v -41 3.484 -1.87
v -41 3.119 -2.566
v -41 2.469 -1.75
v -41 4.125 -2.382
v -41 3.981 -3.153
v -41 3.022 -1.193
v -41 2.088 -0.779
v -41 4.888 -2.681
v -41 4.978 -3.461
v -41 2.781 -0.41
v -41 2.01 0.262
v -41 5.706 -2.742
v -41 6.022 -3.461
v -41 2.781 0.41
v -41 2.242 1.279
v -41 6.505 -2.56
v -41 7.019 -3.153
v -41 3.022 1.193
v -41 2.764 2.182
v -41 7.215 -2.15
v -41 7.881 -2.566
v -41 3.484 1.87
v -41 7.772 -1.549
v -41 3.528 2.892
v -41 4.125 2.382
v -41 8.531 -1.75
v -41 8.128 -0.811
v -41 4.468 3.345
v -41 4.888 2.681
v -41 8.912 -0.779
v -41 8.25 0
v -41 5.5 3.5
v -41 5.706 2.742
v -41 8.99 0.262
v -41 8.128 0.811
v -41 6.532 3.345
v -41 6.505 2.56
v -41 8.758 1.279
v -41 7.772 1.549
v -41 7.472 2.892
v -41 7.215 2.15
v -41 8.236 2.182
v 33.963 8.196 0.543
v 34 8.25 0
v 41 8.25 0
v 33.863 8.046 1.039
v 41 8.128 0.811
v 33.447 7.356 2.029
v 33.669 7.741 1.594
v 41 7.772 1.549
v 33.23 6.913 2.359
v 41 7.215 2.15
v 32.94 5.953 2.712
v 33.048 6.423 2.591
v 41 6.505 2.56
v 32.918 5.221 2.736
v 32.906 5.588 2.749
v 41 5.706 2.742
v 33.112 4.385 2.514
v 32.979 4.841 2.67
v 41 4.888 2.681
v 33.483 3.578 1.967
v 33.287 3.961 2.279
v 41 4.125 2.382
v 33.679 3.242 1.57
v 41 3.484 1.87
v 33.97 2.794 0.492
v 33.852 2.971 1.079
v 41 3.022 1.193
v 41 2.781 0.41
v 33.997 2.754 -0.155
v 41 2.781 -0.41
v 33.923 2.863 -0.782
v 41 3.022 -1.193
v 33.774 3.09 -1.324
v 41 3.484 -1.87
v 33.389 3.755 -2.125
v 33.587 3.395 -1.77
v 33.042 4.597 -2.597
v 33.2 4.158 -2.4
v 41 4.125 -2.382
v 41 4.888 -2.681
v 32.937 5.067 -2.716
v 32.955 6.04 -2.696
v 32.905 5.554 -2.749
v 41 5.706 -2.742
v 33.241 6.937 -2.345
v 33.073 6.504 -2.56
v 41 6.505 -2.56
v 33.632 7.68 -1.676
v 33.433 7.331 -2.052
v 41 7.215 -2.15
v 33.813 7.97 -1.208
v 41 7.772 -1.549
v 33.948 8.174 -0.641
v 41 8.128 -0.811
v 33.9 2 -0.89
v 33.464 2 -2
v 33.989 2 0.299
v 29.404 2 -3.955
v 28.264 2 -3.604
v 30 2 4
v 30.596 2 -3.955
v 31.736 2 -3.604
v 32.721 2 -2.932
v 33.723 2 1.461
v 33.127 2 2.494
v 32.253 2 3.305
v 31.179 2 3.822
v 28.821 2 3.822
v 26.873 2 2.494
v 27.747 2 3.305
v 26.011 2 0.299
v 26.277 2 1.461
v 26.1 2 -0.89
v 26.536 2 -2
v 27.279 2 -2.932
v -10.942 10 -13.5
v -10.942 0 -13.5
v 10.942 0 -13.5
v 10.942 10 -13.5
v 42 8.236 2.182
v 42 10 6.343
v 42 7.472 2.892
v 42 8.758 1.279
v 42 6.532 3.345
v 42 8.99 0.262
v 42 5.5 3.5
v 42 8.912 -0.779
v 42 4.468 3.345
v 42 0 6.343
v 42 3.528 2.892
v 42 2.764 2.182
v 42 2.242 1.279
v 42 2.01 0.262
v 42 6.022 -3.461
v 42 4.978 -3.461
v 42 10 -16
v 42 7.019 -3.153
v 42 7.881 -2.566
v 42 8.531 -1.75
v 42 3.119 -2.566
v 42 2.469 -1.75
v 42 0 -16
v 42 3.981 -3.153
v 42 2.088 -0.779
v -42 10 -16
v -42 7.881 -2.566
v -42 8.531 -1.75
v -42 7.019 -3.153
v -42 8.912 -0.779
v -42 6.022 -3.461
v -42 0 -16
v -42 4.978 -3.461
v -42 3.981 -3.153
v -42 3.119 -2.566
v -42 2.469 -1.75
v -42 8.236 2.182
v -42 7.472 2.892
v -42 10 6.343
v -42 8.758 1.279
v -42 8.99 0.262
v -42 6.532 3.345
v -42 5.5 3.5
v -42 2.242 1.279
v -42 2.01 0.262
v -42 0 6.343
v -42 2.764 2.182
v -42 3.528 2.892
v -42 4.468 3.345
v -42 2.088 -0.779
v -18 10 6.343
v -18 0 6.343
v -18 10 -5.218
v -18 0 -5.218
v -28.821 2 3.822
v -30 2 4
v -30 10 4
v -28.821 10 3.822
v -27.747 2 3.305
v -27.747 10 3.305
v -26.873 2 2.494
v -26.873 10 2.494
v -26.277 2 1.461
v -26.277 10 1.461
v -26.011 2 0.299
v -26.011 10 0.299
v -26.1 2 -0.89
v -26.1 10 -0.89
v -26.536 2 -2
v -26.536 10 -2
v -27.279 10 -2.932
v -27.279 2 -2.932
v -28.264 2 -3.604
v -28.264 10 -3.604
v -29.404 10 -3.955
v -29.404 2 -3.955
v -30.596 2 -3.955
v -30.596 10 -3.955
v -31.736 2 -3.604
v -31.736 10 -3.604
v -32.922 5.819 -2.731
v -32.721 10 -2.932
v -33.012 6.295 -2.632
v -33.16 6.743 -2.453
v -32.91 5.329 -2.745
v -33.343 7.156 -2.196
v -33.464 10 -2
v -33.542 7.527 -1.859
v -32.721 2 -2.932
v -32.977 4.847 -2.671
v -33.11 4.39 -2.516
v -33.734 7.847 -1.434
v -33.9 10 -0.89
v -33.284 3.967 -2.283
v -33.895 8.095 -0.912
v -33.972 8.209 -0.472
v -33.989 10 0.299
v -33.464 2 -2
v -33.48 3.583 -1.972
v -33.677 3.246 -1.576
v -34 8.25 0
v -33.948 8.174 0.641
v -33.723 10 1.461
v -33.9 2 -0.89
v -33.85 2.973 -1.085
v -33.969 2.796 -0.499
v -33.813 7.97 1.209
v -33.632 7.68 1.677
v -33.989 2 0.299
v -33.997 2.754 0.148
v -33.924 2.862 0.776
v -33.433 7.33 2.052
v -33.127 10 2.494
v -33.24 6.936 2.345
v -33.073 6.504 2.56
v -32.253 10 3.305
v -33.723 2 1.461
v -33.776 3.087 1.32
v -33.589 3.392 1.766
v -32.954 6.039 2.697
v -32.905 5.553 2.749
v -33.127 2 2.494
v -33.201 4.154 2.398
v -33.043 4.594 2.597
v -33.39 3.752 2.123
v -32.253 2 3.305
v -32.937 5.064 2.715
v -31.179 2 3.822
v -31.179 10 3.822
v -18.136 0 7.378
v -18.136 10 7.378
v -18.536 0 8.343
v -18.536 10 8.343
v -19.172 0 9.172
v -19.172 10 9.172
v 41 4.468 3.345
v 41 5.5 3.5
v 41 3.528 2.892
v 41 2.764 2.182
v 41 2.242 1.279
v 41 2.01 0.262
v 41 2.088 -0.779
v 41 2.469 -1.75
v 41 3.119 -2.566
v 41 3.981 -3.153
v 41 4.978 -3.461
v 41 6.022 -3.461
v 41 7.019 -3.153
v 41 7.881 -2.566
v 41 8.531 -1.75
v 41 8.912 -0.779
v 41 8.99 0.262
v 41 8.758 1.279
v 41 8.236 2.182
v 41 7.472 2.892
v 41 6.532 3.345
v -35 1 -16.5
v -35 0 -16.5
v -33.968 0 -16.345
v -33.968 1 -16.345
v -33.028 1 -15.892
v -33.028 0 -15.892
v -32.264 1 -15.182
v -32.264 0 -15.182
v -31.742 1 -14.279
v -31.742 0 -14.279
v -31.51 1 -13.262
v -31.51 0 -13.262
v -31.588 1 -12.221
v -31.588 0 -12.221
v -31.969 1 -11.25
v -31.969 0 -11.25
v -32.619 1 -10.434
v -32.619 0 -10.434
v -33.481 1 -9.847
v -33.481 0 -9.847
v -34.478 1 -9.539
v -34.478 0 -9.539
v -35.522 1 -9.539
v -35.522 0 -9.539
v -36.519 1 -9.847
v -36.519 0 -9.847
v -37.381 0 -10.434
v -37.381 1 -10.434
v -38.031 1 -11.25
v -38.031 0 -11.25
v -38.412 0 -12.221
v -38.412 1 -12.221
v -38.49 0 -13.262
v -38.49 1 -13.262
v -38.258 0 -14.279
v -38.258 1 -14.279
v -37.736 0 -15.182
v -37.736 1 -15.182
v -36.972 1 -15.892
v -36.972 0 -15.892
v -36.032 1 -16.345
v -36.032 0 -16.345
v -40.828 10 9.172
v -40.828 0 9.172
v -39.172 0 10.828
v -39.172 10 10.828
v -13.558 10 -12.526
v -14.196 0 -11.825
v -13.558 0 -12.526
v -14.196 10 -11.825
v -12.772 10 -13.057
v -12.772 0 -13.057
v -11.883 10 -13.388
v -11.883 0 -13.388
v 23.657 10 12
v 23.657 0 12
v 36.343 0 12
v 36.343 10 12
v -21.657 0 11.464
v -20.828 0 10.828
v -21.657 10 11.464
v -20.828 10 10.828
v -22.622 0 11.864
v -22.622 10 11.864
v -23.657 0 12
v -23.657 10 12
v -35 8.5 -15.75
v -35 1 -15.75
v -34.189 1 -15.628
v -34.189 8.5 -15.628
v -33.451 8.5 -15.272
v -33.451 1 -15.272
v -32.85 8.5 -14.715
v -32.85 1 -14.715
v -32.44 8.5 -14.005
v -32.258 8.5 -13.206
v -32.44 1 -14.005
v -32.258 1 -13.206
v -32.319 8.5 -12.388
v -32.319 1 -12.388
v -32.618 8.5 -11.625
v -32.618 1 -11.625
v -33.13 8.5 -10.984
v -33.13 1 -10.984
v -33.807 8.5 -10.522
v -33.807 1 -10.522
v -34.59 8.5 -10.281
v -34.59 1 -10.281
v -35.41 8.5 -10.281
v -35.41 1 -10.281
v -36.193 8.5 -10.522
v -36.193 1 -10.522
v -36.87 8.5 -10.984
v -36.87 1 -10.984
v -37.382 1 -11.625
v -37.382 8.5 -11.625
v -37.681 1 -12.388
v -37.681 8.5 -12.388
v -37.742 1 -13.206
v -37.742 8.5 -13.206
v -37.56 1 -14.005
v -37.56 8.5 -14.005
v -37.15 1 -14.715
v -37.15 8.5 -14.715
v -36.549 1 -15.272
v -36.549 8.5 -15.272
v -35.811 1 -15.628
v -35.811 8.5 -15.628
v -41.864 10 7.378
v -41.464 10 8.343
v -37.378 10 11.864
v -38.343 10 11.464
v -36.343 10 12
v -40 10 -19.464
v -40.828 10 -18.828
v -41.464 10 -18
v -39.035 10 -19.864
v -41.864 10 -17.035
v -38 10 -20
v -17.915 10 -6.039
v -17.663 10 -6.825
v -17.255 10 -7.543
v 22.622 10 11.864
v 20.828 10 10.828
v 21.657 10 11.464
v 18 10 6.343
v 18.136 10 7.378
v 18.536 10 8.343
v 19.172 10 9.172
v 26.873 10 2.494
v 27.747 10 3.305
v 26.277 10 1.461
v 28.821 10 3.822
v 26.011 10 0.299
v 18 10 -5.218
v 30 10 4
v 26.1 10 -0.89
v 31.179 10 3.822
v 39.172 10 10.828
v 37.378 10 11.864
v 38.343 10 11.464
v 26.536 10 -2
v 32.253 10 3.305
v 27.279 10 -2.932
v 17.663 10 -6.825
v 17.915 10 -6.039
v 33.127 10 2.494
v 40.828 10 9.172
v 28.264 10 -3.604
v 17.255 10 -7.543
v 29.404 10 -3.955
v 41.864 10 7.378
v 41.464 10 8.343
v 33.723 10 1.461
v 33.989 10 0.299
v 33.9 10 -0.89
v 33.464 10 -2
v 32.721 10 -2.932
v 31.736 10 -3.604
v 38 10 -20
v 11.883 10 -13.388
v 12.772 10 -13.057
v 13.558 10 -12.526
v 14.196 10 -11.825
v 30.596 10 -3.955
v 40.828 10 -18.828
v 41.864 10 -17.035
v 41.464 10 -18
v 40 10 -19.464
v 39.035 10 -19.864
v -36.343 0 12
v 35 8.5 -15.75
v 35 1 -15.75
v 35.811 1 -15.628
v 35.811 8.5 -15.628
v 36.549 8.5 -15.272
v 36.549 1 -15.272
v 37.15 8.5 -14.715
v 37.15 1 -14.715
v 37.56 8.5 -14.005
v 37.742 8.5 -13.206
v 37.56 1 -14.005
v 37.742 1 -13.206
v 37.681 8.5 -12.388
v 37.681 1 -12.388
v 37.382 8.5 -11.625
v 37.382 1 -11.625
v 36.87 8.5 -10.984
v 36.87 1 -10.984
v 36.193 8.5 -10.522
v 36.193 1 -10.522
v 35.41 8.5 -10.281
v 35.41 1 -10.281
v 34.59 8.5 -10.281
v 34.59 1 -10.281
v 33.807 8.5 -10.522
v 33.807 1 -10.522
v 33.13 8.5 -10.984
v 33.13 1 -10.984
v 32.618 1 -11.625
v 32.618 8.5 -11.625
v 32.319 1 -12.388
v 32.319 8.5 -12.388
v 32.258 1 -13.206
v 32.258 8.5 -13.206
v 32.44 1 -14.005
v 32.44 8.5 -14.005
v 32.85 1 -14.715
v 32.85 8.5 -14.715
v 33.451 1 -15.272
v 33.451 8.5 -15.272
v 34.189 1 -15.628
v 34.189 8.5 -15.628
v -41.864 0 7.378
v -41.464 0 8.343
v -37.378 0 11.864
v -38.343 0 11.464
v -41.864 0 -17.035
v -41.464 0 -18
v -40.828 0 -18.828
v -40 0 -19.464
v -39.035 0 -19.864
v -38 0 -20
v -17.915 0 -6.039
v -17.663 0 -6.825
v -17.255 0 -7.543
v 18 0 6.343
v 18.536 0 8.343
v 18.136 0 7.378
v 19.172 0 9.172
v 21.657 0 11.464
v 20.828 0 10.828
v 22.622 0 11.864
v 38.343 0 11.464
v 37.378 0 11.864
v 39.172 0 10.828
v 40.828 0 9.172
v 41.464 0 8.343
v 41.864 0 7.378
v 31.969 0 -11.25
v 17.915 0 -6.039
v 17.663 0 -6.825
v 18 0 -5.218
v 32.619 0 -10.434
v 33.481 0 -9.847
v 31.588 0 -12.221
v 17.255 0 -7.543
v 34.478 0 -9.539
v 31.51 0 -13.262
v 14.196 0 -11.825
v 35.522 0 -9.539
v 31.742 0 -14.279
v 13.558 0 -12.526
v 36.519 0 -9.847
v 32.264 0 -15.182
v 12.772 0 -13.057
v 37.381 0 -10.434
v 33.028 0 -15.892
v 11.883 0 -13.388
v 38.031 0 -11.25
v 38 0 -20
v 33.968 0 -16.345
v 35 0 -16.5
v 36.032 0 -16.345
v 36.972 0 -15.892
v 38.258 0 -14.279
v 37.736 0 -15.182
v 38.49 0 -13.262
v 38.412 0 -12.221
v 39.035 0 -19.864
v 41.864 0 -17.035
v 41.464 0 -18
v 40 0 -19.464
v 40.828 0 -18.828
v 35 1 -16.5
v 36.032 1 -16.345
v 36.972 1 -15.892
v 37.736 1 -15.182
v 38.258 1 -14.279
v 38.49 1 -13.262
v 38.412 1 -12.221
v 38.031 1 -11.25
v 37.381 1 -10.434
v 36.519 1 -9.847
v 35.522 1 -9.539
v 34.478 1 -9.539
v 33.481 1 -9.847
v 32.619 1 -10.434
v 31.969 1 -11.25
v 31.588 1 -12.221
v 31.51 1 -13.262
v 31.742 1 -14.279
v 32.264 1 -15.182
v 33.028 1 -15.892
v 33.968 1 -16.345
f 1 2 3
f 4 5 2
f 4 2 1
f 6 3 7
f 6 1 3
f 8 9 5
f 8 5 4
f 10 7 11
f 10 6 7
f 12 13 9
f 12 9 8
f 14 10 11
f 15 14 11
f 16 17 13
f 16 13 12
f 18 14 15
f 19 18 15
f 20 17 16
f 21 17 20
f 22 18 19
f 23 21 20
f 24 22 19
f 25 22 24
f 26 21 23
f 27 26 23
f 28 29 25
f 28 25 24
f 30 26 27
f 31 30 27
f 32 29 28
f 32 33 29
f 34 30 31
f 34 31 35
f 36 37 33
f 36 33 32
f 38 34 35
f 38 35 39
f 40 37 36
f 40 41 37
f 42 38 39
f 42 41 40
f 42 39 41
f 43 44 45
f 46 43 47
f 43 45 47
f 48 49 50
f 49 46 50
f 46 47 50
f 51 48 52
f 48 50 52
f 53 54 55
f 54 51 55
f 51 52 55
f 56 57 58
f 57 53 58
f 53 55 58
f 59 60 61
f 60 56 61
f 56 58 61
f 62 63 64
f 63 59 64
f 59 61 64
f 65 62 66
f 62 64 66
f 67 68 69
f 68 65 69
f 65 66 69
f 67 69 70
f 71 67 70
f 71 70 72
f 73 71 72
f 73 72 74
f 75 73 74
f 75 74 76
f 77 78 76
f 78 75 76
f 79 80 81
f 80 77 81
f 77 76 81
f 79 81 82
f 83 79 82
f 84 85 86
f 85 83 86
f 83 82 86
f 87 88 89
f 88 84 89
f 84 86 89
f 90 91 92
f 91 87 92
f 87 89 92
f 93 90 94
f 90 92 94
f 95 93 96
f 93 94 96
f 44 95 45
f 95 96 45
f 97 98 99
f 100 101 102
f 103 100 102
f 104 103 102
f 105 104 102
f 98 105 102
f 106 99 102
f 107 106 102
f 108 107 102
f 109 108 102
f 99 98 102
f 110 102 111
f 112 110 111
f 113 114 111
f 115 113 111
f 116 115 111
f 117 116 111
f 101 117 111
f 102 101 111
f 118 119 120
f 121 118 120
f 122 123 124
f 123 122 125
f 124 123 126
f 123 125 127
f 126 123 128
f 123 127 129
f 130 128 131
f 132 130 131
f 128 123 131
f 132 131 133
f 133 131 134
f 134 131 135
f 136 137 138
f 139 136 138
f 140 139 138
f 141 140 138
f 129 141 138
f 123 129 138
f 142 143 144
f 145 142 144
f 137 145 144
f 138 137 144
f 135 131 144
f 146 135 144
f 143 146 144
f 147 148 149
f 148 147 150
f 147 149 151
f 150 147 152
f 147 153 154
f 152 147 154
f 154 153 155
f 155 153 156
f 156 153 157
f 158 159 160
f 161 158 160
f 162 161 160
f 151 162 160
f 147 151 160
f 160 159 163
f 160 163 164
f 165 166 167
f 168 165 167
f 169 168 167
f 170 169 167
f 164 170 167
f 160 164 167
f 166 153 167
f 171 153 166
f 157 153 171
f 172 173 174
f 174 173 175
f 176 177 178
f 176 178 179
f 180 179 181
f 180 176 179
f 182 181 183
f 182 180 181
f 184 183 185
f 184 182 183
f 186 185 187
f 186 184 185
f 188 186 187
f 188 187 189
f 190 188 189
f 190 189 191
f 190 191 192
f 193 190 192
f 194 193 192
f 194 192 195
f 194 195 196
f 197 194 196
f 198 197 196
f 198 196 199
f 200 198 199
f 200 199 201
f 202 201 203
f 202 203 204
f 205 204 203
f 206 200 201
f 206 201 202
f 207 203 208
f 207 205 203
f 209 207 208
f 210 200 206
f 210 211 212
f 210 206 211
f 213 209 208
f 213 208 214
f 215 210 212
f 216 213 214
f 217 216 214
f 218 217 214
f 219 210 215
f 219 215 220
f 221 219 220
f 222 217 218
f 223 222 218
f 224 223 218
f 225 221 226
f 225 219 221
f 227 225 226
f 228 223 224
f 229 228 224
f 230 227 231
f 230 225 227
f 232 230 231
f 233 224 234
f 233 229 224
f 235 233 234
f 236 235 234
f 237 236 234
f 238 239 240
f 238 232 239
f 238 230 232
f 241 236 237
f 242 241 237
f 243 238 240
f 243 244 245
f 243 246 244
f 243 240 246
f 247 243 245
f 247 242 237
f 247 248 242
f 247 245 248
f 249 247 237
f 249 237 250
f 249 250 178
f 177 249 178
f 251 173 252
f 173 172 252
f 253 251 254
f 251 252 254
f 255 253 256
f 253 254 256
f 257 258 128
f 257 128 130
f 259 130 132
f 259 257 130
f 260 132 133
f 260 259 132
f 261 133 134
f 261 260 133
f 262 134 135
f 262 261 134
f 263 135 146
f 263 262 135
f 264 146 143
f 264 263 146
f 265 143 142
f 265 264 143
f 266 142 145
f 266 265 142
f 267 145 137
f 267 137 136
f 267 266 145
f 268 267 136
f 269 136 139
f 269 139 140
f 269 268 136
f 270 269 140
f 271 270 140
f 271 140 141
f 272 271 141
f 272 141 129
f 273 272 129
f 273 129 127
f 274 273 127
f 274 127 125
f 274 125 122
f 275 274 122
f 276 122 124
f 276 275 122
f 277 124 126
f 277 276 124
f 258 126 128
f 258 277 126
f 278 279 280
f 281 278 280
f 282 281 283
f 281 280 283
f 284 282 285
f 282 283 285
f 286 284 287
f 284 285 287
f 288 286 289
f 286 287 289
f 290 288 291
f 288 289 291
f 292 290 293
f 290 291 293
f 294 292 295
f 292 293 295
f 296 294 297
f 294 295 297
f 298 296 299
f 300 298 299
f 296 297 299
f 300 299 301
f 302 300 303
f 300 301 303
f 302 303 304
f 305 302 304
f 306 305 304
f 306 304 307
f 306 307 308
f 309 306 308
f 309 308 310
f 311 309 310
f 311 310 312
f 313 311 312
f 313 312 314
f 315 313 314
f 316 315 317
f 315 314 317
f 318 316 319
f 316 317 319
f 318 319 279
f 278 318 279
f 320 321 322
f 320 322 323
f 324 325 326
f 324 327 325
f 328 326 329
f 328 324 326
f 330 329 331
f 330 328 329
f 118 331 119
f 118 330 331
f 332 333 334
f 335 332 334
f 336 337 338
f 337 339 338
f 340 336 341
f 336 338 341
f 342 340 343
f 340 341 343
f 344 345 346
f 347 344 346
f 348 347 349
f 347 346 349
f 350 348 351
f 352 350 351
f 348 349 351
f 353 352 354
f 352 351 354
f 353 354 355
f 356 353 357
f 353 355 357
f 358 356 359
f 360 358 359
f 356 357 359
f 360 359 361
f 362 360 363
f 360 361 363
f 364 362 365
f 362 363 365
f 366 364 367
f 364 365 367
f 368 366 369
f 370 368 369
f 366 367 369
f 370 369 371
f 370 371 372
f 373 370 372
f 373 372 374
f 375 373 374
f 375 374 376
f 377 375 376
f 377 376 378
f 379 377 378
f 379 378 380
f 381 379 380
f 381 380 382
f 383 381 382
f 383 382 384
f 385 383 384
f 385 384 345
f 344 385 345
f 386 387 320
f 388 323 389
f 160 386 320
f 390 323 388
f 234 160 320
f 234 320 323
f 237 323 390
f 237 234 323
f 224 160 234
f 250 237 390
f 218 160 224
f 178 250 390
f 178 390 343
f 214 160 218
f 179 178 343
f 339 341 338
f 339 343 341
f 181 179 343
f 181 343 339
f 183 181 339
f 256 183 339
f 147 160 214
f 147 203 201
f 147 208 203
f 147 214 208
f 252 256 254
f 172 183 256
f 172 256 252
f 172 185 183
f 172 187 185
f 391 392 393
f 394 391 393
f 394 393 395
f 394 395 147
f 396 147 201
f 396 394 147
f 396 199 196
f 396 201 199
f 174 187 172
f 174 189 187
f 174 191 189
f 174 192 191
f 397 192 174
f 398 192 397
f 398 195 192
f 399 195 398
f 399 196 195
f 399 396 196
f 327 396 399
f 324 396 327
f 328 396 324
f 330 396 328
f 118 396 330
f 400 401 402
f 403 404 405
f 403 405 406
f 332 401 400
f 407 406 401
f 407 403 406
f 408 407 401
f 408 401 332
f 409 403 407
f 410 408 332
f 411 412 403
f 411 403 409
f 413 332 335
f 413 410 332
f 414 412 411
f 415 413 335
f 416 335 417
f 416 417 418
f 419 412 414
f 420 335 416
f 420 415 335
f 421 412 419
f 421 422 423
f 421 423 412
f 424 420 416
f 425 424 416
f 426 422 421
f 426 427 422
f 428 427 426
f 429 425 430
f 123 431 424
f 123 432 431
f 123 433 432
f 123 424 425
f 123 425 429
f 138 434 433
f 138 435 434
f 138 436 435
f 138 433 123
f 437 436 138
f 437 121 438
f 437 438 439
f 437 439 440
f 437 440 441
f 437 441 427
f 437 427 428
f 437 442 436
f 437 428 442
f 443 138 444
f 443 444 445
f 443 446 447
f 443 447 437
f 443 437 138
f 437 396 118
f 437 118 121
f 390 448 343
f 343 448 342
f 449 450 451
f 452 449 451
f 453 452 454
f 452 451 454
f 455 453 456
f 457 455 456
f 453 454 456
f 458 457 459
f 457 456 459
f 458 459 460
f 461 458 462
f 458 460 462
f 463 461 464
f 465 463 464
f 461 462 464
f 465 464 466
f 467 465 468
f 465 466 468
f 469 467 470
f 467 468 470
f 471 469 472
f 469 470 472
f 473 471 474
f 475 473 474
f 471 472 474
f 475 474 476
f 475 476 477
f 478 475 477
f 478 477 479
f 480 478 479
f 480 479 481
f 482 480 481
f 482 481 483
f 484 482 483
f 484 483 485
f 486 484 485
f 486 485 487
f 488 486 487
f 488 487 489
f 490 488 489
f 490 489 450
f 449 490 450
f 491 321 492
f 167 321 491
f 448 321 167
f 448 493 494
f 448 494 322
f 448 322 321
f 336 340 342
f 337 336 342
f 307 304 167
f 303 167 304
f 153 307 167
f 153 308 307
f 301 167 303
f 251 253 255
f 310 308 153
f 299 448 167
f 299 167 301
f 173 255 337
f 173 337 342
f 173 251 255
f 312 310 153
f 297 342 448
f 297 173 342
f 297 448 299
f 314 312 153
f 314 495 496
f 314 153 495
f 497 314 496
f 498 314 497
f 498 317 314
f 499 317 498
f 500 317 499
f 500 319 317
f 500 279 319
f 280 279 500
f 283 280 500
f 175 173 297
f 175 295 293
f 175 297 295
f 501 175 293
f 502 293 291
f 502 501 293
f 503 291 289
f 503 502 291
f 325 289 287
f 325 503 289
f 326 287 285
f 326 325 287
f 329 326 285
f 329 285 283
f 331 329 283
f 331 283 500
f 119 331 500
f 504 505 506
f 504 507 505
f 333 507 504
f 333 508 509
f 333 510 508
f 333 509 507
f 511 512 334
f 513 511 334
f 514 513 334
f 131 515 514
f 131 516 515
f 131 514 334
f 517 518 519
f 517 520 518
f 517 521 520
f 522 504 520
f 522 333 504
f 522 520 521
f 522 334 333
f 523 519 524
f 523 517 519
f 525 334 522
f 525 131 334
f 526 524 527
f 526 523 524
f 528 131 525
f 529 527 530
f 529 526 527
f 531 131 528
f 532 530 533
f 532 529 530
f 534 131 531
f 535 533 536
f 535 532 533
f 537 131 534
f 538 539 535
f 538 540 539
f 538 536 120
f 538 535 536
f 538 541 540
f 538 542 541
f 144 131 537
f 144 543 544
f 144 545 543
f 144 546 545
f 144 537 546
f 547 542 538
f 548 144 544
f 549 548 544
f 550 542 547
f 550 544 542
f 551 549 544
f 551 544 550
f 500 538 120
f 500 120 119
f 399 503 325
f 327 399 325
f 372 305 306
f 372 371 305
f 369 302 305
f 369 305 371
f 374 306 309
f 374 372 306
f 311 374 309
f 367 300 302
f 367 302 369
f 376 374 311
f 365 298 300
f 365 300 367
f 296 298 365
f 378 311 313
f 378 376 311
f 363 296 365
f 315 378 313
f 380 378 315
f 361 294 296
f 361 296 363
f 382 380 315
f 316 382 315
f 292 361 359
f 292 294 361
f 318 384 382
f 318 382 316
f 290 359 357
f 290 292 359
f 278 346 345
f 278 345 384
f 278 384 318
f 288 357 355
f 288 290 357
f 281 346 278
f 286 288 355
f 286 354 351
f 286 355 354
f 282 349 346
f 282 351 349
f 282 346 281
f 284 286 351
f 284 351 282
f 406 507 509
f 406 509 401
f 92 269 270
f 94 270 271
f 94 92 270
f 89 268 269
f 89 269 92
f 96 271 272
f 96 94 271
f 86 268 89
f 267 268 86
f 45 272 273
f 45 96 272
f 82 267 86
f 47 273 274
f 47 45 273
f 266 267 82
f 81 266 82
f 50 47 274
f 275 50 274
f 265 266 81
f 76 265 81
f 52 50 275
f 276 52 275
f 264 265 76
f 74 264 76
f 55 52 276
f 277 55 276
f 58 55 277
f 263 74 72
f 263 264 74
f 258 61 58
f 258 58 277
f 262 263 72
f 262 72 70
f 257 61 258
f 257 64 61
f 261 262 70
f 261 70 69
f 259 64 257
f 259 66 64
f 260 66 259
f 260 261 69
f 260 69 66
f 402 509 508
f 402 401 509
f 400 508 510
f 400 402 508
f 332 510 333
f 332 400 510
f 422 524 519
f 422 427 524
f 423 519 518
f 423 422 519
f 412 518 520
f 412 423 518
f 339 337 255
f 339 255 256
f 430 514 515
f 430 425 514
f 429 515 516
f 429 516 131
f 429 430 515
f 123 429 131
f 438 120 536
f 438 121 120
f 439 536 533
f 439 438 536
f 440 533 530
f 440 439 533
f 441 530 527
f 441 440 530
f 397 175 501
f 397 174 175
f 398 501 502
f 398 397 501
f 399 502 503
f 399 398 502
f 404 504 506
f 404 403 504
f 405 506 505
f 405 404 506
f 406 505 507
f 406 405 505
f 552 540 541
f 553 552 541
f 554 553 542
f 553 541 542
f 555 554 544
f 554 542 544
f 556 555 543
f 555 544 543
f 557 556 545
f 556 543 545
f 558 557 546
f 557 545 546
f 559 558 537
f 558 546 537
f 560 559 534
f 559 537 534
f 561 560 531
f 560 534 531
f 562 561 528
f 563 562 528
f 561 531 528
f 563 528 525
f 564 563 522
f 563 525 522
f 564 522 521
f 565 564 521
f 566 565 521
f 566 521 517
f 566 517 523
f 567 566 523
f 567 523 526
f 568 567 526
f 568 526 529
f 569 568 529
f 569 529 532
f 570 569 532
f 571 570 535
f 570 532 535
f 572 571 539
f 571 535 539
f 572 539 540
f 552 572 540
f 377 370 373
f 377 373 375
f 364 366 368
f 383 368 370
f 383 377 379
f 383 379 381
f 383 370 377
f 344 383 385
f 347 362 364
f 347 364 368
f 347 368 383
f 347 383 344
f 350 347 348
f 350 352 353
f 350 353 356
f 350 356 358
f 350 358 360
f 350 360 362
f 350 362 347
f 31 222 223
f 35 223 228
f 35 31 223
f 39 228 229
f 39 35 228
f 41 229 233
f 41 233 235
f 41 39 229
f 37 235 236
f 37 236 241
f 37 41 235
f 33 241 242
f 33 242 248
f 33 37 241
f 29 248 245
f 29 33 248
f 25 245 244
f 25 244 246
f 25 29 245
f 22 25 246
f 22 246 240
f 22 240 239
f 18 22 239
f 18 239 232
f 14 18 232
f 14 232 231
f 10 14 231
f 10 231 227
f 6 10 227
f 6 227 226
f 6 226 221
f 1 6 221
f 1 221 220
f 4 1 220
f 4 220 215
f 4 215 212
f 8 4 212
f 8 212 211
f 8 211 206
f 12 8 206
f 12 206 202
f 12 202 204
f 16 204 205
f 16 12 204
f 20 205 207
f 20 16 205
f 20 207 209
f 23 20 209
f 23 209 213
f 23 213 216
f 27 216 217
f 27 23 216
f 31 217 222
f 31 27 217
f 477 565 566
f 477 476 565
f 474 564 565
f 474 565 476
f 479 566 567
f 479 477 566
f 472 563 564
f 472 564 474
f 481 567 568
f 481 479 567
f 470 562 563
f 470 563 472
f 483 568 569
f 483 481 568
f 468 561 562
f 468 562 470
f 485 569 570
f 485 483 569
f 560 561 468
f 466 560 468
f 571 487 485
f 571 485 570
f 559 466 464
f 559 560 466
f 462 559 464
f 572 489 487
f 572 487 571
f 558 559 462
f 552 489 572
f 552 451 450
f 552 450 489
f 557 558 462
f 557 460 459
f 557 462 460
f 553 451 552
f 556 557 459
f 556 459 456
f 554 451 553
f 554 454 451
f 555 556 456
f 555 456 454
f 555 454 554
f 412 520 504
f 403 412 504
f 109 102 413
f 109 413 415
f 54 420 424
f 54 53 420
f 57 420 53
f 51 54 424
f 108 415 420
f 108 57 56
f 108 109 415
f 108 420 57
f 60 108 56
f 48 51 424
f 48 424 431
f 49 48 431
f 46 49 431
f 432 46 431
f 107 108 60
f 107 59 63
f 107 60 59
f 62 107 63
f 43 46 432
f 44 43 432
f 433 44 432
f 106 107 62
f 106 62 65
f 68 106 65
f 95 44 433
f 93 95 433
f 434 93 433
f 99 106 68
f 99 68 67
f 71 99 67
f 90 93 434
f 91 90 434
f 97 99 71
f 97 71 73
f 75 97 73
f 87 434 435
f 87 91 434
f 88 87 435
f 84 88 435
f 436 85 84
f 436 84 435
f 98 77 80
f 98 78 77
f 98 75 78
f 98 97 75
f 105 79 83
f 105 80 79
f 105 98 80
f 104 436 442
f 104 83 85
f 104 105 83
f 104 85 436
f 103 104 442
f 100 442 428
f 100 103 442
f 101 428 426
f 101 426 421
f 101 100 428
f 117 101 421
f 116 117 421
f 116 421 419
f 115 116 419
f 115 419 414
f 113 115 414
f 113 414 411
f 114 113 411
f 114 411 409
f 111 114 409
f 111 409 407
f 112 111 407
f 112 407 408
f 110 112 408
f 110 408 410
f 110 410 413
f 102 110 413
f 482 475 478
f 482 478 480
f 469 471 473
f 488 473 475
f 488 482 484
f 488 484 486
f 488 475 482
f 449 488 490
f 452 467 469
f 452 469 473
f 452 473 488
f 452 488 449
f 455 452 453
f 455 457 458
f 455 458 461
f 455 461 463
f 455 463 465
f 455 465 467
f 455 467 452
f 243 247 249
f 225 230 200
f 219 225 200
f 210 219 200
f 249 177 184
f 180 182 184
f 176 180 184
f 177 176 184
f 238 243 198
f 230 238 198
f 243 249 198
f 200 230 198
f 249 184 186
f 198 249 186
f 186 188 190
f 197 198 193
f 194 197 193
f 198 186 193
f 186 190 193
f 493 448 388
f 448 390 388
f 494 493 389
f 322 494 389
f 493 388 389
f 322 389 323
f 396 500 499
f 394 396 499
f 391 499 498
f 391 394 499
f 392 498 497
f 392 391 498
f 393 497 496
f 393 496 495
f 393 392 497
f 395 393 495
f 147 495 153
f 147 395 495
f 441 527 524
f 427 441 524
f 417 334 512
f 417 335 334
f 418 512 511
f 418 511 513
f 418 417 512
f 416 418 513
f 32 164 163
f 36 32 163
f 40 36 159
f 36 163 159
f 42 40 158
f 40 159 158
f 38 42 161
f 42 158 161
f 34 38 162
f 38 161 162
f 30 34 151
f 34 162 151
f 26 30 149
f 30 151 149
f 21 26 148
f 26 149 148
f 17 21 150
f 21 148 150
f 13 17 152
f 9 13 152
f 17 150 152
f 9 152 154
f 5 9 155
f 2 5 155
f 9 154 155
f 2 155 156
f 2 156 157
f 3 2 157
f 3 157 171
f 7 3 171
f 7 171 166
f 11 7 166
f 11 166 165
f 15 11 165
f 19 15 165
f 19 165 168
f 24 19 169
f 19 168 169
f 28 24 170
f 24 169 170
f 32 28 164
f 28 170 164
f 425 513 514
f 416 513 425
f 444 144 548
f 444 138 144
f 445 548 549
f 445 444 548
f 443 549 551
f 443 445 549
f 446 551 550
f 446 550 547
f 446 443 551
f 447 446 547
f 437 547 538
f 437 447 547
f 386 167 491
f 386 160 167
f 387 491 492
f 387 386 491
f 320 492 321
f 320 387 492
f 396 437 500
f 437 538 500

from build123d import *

# Parameters (mm, degrees)
ESQUISSE1_R                 = 4
BOSS_EXTRU_1_DEPTH          = 10
CHANFREIN3_SIZE             = 4
CONG_2_R                    = 4
ESQUISSE3_R                 = 4
BOSS_EXTRU_2_DEPTH          = 2
ENL_V_START                 = -42
ENL_V_MAT_EXTRU_4_OUTLINE_R = 2.75
ENL_V_MAT_EXTRU_4_DEPTH     = 9.0952626
CONG_4_R                    = 4
ESQUISSE7_R                 = 2.75
ENL_V_MAT_EXTRU_5_DEPTH     = 8.5
ESQUISSE7_4_R               = 3.5
ESQUISSE7_4_R_2             = 2.75
ENL_V_MAT_EXTRU_8_DEPTH     = 1
ESQUISSE8_R                 = 3.5
ENL_V_MAT_EXTRU_9_DEPTH     = 1
ENL_V_START_2               = -1
ESQUISSE9_R                 = 3.5
ENL_V_MAT_EXTRU_10_DEPTH    = 1


# Read off the part's stored shape, not the designer's step: Enlèv. mat.-Extru.4
with BuildPart() as part:
    # Esquisse1 → Boss.-Extru.1 (new body)
    # profile 1 of 4: a face of its own
    with BuildSketch(Plane(origin=(0, 0, 0), x_dir=(1, 0, 0), z_dir=(0, 1, 0))):
        Polygon((-18, 6.5), (-18, 12), (-18, 13.5), (-13, 13.5), (0, 13.5), (0, 20), (-42, 20), (-42, 12), (-42, 0), (-42, -12), (-18, -12), align=None)
        with Locations(Location((-30, 0, 0), (0, 0, 270))):
            Circle(ESQUISSE1_R, mode=Mode.SUBTRACT)
    # profile 2 of 4: a face of its own
    with BuildSketch(Plane(origin=(0, 0, 0), x_dir=(1, 0, 0), z_dir=(0, 1, 0))):
        Polygon((0, 20), (0, 13.5), (13, 13.5), (18, 13.5), (18, 12), (18, 6.5), (18, -12), (42, -12), (42, 0), (42, 12), (42, 20), align=None)
        with Locations(Location((30, 0, 0), (0, 0, 270))):
            Circle(ESQUISSE1_R, mode=Mode.SUBTRACT)
    # profile 3 of 4: a face of its own
    with BuildSketch(Plane(origin=(0, 0, 0), x_dir=(1, 0, 0), z_dir=(0, 1, 0))):
        Polygon((-18, 13.5), (-18, 12), (-18, 6.5), (-13, 13.5), align=None)
    # profile 4 of 4: a face of its own
    with BuildSketch(Plane(origin=(0, 0, 0), x_dir=(1, 0, 0), z_dir=(0, 1, 0))):
        Polygon((18, 13.5), (13, 13.5), (18, 6.5), (18, 12), align=None)
    extrude(amount=BOSS_EXTRU_1_DEPTH)

    # Chanfrein3
    chanfrein3_edges = [part.edges().sort_by_distance(p)[0] for p in [
        (-18, 5, 12),
        (-42, 5, 12),
        (42, 5, 12),
        (18, 5, 12),
    ]]
    chamfer(chanfrein3_edges, length=CHANFREIN3_SIZE)

    # Congé2
    cong_2_edges = [part.edges().sort_by_distance(p)[0] for p in [
        (42, 5, 8),
        (22, 5, 12),
        (38, 5, 12),
        (18, 5, 8),
        (-22, 5, 12),
        (-38, 5, 12),
        (-42, 5, 8),
        (-18, 5, 8),
    ]]
    fillet(cong_2_edges, radius=CONG_2_R)

    # Esquisse3 → Boss.-Extru.2 (add)
    with BuildSketch(Plane.XZ):
        with Locations(Location((-30, 0, 0), (0, 0, 270))):
            Circle(ESQUISSE3_R)
        with Locations(Location((30, 0, 0), (0, 0, 90))):
            Circle(ESQUISSE3_R)
    extrude(amount=-BOSS_EXTRU_2_DEPTH)

    # Enlèv. mat.-Extru.4 outline → Enlèv. mat.-Extru.4 (cut)
    with BuildSketch(Plane.YZ.offset(ENL_V_START)):
        with Locations((5.5, 0)):
            Circle(ENL_V_MAT_EXTRU_4_OUTLINE_R)
    enl_v_mat_extru_4 = extrude(amount=ENL_V_MAT_EXTRU_4_DEPTH, mode=Mode.SUBTRACT)

    # Symétrie10: Enlèv. mat.-Extru.4 across plane
    add(enl_v_mat_extru_4.mirror(Plane(origin=(0, 0, 0), x_dir=(0, 0, 1), z_dir=(1, 0, 0))), mode=Mode.SUBTRACT)

    # Congé4
    cong_4_edges = [part.edges().sort_by_distance(p)[0] for p in [
        (-42, 5, -20),
        (42, 5, -20),
        (18, 5, -6.5),
        (13, 5, -13.5),
        (-13, 5, -13.5),
        (-18, 5, -6.5),
    ]]
    fillet(cong_4_edges, radius=CONG_4_R)

    # Esquisse7 → Enlèv. mat.-Extru.5 (cut)
    with BuildSketch(Plane.XZ):
        with Locations(Location((-35, -13, 0), (0, 0, 270))):
            Circle(ESQUISSE7_R)
        with Locations(Location((35, -13, 0), (0, 0, 270))):
            Circle(ESQUISSE7_R)
    extrude(amount=-ENL_V_MAT_EXTRU_5_DEPTH, mode=Mode.SUBTRACT)

    # Esquisse7<4> → Enlèv. mat.-Extru.8 (cut)
    # profile 1 of 2: a face of its own
    with BuildSketch(Plane.XZ):
        with Locations(Location((-35, -13, 0), (0, 0, 270))):
            Circle(ESQUISSE7_4_R)
        with Locations(Location((-35, -13, 0), (0, 0, 270))):
            Circle(ESQUISSE7_4_R_2, mode=Mode.SUBTRACT)
    # profile 2 of 2: a face of its own
    with BuildSketch(Plane.XZ):
        with Locations(Location((35, -13, 0), (0, 0, 270))):
            Circle(ESQUISSE7_4_R)
        with Locations(Location((35, -13, 0), (0, 0, 270))):
            Circle(ESQUISSE7_4_R_2, mode=Mode.SUBTRACT)
    extrude(amount=-ENL_V_MAT_EXTRU_8_DEPTH, mode=Mode.SUBTRACT)

    # Esquisse8 → Enlèv. mat.-Extru.9 (cut)
    with BuildSketch(Plane.ZY.offset(42)):
        with Locations((0, 5.5)):
            Circle(ESQUISSE8_R)
    extrude(amount=-ENL_V_MAT_EXTRU_9_DEPTH, mode=Mode.SUBTRACT)

    # Esquisse9 → Enlèv. mat.-Extru.10 (cut)
    with BuildSketch(Plane(origin=(42, 0, 0), x_dir=(0, 0, -1), z_dir=(1, 0, 0)).offset(ENL_V_START_2)):
        with Locations(Location((0, 5.5, 0), (0, 0, 180))):
            Circle(ESQUISSE9_R)
    extrude(amount=ENL_V_MAT_EXTRU_10_DEPTH, mode=Mode.SUBTRACT)


solid = part.part
